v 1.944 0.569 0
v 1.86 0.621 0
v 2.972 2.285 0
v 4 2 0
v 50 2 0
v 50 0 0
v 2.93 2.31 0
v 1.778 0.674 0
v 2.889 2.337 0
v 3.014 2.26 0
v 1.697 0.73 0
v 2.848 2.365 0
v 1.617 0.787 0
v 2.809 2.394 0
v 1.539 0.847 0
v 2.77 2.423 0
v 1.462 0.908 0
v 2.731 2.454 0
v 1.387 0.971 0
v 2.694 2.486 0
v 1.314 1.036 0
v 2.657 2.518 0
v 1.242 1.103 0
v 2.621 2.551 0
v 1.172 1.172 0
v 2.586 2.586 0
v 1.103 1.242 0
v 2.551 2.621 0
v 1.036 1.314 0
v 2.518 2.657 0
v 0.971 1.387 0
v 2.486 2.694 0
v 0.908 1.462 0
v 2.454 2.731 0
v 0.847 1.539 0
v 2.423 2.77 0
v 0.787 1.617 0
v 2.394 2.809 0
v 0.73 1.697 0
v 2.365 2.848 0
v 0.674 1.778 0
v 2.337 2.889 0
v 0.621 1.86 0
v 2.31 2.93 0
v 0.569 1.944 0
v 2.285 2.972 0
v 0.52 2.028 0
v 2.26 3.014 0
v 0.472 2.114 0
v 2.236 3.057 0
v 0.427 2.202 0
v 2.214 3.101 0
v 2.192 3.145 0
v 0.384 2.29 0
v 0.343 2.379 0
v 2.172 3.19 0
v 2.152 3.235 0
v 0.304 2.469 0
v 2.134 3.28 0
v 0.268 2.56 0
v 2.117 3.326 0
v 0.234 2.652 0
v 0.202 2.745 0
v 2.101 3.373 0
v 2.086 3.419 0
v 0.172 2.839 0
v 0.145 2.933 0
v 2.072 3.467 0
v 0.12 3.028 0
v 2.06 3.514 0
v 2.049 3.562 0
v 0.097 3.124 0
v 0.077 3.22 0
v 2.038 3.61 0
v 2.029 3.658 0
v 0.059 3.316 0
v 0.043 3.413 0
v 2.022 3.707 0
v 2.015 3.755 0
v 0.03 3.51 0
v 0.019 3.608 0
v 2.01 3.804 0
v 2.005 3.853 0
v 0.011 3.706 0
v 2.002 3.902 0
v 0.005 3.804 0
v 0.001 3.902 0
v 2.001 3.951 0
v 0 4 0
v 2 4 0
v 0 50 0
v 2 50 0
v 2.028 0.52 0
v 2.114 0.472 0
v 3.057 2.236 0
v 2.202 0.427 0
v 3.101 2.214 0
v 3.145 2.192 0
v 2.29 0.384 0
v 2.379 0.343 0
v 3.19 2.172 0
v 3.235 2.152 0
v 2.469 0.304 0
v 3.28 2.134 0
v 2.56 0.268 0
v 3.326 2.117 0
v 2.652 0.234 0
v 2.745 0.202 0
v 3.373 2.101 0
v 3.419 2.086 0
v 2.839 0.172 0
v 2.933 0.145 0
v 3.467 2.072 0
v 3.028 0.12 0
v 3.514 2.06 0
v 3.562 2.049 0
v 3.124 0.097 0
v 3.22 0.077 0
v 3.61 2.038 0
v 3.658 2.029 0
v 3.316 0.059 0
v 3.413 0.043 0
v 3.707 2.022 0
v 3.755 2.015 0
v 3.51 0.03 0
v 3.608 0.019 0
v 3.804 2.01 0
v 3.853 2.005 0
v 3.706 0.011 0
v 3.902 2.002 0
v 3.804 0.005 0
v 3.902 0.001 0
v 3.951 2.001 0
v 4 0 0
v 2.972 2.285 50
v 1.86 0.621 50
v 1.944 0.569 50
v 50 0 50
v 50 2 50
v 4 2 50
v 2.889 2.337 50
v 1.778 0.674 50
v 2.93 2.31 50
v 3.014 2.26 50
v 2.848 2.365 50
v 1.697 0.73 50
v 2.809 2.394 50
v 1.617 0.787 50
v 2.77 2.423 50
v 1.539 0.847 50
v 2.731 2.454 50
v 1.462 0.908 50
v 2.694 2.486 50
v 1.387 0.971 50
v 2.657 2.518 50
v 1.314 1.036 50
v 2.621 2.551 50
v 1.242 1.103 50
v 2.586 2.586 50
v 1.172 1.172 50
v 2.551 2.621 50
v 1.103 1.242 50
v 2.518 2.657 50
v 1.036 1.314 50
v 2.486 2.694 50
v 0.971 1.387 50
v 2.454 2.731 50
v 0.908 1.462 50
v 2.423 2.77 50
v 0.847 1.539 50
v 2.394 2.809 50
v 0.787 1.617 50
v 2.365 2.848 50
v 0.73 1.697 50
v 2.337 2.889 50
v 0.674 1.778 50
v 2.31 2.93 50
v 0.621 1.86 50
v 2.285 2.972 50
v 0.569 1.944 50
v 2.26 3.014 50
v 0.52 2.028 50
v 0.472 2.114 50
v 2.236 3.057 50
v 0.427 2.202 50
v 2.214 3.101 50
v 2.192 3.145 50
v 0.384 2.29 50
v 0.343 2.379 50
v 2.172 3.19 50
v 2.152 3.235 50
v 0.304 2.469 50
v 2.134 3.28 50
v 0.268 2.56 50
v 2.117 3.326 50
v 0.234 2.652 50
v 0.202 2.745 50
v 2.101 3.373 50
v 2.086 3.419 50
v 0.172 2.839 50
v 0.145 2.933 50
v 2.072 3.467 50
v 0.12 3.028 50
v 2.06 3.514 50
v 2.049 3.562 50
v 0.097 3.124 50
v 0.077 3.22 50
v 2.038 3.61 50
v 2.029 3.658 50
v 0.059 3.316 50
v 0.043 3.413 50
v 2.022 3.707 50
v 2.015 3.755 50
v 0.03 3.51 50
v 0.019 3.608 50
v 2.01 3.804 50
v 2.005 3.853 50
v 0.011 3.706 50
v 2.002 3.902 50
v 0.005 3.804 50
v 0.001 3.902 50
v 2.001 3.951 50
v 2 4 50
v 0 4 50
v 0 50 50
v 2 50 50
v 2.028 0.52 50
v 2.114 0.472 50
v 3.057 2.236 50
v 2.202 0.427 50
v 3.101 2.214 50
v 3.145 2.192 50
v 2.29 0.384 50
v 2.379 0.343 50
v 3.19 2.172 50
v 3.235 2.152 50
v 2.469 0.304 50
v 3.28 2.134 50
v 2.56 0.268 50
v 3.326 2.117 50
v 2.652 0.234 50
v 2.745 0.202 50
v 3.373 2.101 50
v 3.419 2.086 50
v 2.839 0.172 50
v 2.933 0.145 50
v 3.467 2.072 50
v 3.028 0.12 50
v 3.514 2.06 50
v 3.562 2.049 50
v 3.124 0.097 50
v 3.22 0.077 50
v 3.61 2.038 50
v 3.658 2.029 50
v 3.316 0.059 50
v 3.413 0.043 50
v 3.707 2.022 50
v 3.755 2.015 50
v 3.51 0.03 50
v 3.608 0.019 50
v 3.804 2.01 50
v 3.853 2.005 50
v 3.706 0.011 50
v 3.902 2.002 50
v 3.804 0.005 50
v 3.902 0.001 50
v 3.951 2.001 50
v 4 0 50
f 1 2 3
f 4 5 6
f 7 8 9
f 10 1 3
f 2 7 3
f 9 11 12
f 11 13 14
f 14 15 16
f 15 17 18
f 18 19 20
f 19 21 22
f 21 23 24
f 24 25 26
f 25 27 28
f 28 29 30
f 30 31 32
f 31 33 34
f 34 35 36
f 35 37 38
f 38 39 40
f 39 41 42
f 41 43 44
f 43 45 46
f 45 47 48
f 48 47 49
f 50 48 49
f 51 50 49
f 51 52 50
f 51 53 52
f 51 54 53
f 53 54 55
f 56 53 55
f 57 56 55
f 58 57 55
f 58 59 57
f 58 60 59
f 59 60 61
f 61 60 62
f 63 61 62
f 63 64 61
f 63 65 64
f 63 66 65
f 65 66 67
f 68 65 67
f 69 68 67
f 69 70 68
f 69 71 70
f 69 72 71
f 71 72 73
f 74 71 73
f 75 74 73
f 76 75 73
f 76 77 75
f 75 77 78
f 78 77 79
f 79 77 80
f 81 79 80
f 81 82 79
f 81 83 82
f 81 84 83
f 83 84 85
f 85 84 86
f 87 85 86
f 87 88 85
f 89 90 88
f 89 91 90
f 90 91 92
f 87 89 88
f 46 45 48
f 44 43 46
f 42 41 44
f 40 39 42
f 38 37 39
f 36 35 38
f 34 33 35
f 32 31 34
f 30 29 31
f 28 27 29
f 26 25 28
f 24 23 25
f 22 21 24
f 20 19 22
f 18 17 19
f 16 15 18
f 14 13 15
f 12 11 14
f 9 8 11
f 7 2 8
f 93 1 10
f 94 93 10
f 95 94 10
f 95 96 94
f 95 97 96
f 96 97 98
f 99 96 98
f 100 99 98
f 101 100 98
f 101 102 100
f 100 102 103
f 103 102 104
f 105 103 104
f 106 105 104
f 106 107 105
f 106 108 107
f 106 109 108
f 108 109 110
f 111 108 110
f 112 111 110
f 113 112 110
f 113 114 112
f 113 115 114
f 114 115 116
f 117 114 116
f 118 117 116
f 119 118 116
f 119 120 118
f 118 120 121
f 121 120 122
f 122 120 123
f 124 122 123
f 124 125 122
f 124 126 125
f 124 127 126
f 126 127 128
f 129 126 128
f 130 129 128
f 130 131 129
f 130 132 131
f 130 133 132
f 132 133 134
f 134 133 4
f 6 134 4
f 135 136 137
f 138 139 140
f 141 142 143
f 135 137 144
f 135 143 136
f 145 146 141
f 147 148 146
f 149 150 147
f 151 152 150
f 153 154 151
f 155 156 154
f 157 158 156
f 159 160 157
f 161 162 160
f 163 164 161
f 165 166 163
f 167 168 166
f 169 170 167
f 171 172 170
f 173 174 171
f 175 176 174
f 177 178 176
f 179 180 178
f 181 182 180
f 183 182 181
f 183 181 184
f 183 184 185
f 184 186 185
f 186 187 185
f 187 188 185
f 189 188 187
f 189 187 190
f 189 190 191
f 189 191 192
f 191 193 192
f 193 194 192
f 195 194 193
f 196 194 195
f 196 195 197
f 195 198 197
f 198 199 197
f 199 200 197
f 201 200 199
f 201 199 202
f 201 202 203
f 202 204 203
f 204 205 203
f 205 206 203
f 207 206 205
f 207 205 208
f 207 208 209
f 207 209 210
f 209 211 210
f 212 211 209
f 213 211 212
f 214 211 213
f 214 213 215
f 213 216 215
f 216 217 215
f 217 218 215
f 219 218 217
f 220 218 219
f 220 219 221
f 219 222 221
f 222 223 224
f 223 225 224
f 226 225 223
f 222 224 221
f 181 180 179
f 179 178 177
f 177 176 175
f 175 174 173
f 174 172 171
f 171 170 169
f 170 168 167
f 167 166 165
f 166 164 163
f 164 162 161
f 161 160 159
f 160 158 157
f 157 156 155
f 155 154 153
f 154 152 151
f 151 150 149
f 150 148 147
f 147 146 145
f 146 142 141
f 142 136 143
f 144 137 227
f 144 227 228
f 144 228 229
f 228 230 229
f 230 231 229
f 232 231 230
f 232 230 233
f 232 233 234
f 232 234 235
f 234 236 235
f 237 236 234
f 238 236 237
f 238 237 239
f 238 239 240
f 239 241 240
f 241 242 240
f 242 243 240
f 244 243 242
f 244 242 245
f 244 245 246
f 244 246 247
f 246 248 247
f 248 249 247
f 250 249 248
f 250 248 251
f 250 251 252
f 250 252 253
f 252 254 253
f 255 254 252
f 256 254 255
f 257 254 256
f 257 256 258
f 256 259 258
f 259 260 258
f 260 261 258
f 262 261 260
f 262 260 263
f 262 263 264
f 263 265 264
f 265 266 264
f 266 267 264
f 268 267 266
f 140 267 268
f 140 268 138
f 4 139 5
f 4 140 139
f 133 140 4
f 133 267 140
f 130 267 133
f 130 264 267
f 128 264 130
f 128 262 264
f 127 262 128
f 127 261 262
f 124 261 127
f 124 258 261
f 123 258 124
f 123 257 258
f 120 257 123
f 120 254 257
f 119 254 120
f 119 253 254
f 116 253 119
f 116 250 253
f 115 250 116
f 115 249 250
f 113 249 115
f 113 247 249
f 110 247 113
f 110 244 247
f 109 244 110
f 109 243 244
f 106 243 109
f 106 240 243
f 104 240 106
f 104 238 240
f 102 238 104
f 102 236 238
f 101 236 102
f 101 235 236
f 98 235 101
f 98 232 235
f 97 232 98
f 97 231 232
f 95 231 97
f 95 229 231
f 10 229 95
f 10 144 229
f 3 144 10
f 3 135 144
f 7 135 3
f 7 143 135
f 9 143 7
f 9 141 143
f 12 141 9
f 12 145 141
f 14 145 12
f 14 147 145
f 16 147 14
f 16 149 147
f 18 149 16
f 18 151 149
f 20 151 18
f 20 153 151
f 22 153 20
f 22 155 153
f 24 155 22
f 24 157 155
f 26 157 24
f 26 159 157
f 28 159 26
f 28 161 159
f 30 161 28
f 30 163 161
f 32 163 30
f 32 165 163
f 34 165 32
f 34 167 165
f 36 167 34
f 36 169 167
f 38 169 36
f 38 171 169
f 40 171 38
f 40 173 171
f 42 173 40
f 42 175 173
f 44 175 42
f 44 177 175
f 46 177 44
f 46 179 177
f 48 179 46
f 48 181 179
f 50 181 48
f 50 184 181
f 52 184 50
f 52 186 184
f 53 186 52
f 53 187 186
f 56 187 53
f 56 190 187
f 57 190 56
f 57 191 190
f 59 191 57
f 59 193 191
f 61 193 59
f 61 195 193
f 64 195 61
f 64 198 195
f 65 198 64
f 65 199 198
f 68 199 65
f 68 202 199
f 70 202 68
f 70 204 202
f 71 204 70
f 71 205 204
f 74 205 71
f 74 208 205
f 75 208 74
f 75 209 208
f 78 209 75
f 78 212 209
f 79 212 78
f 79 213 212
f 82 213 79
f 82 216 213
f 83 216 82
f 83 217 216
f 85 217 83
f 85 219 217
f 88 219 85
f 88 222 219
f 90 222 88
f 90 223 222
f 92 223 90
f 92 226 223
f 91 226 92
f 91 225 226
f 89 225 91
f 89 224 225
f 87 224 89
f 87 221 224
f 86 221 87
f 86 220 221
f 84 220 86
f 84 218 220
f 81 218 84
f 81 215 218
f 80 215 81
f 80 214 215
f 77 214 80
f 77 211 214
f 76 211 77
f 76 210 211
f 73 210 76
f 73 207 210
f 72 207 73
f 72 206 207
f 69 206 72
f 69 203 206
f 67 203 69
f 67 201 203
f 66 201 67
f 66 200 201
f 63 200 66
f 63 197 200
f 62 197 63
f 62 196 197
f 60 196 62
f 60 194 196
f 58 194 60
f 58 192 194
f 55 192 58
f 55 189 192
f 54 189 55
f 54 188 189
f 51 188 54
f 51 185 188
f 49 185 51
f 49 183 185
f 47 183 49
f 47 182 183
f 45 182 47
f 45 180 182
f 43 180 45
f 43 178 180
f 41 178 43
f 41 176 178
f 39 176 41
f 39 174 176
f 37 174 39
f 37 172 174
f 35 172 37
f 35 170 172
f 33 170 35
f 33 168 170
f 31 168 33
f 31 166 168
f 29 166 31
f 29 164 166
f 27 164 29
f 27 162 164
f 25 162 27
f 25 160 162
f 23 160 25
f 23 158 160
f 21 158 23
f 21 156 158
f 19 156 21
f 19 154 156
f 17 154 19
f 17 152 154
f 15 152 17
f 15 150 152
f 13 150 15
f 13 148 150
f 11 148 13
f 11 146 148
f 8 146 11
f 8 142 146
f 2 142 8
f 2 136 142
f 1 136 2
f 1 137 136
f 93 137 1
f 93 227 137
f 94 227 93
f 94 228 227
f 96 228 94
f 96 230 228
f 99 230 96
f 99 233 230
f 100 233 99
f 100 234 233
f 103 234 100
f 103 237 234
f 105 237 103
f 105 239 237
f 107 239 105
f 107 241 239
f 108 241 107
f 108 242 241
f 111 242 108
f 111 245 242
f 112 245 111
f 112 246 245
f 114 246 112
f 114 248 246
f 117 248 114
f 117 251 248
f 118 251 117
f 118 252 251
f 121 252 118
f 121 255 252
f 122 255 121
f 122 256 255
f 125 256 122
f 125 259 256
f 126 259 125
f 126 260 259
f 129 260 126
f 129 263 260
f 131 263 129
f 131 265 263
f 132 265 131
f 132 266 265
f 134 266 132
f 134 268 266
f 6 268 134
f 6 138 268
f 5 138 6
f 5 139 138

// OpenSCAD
// Sheet-metal L-bracket: t=2 mm, r_i=2 mm, 90° bend, flanges 50×50 mm, width 50 mm
//
// Coordinate convention (cross-section XY):
//   Theoretical outside corner at origin.
//   Flange 1 rises along +Y; flange 2 extends along +X.
//   Arc centre at (r_o, r_o).  Sheet extruded in +Z for bracket width.

t     = 2.0;        // sheet thickness (mm)
r_i   = 2.0;        // inside bend radius (mm)
r_o   = r_i + t;    // outside bend radius = 4.0 mm
L1    = 50.0;       // flange 1 outside length (mm)
L2    = 50.0;       // flange 2 outside length (mm)
W     = 50.0;       // bracket width (mm)
K     = 0.45;       // K-factor
N_ARC = 64;         // arc segments

// ── Developed flat-blank length ──────────────────────────────────────────────
// Bend allowance:  BA = (π/2) × (r_i + K·t)
//   = (π/2) × (2.0 + 0.45×2.0) = (π/2) × 2.9 ≈ 4.5553 mm
// Each flange's straight run to the outside tangent point = L - r_o = 50 - 4 = 46 mm
// flat_length = (L1 - r_o) + BA + (L2 - r_o)
BA             = (PI / 2) * (r_i + K * t);
flat_length_mm = (L1 - r_o) + BA + (L2 - r_o);

echo(str("MAKERBENCH-SHEETMETAL: {\"thickness_mm\": ", t,
         ", \"bend_radius_mm\": ", r_i,
         ", \"flat_length_mm\": ", flat_length_mm, "}"));

// ── Cross-section polygon ─────────────────────────────────────────────────────
// Arc centre (both arcs are concentric, centre at the outside tangent corner)
cx = r_o;
cy = r_o;

// Parametric arc: sweep angle a0→a1 over N_ARC equal steps (endpoints included)
function arc_pts(r, a0, a1) =
    [for (i = [0 : N_ARC])
        [cx + r * cos(a0 + (a1 - a0) * i / N_ARC),
         cy + r * sin(a0 + (a1 - a0) * i / N_ARC)]];

// Clockwise trace of the closed cross-section:
//  (0,L1)  → outer arc (0,r_o)→(r_o,0)  → (L2,0)→(L2,t)
//          → inner arc (r_o,t)→(t,r_o)  → (t,L1)  → close
pts = concat(
    [[0, L1]],                 // tip of flange-1 outer face
    arc_pts(r_o, 180, 270),    // outside arc: (0,r_o) → (r_o,0)
    [[L2, 0], [L2, t]],        // flange-2 outer tip, step inward
    arc_pts(r_i, 270, 180),    // inside arc: (r_o,t) → (t,r_o)
    [[t, L1]]                  // tip of flange-1 inner face
);

// ── 3-D solid ─────────────────────────────────────────────────────────────────
linear_extrude(height = W)
    polygon(pts);
